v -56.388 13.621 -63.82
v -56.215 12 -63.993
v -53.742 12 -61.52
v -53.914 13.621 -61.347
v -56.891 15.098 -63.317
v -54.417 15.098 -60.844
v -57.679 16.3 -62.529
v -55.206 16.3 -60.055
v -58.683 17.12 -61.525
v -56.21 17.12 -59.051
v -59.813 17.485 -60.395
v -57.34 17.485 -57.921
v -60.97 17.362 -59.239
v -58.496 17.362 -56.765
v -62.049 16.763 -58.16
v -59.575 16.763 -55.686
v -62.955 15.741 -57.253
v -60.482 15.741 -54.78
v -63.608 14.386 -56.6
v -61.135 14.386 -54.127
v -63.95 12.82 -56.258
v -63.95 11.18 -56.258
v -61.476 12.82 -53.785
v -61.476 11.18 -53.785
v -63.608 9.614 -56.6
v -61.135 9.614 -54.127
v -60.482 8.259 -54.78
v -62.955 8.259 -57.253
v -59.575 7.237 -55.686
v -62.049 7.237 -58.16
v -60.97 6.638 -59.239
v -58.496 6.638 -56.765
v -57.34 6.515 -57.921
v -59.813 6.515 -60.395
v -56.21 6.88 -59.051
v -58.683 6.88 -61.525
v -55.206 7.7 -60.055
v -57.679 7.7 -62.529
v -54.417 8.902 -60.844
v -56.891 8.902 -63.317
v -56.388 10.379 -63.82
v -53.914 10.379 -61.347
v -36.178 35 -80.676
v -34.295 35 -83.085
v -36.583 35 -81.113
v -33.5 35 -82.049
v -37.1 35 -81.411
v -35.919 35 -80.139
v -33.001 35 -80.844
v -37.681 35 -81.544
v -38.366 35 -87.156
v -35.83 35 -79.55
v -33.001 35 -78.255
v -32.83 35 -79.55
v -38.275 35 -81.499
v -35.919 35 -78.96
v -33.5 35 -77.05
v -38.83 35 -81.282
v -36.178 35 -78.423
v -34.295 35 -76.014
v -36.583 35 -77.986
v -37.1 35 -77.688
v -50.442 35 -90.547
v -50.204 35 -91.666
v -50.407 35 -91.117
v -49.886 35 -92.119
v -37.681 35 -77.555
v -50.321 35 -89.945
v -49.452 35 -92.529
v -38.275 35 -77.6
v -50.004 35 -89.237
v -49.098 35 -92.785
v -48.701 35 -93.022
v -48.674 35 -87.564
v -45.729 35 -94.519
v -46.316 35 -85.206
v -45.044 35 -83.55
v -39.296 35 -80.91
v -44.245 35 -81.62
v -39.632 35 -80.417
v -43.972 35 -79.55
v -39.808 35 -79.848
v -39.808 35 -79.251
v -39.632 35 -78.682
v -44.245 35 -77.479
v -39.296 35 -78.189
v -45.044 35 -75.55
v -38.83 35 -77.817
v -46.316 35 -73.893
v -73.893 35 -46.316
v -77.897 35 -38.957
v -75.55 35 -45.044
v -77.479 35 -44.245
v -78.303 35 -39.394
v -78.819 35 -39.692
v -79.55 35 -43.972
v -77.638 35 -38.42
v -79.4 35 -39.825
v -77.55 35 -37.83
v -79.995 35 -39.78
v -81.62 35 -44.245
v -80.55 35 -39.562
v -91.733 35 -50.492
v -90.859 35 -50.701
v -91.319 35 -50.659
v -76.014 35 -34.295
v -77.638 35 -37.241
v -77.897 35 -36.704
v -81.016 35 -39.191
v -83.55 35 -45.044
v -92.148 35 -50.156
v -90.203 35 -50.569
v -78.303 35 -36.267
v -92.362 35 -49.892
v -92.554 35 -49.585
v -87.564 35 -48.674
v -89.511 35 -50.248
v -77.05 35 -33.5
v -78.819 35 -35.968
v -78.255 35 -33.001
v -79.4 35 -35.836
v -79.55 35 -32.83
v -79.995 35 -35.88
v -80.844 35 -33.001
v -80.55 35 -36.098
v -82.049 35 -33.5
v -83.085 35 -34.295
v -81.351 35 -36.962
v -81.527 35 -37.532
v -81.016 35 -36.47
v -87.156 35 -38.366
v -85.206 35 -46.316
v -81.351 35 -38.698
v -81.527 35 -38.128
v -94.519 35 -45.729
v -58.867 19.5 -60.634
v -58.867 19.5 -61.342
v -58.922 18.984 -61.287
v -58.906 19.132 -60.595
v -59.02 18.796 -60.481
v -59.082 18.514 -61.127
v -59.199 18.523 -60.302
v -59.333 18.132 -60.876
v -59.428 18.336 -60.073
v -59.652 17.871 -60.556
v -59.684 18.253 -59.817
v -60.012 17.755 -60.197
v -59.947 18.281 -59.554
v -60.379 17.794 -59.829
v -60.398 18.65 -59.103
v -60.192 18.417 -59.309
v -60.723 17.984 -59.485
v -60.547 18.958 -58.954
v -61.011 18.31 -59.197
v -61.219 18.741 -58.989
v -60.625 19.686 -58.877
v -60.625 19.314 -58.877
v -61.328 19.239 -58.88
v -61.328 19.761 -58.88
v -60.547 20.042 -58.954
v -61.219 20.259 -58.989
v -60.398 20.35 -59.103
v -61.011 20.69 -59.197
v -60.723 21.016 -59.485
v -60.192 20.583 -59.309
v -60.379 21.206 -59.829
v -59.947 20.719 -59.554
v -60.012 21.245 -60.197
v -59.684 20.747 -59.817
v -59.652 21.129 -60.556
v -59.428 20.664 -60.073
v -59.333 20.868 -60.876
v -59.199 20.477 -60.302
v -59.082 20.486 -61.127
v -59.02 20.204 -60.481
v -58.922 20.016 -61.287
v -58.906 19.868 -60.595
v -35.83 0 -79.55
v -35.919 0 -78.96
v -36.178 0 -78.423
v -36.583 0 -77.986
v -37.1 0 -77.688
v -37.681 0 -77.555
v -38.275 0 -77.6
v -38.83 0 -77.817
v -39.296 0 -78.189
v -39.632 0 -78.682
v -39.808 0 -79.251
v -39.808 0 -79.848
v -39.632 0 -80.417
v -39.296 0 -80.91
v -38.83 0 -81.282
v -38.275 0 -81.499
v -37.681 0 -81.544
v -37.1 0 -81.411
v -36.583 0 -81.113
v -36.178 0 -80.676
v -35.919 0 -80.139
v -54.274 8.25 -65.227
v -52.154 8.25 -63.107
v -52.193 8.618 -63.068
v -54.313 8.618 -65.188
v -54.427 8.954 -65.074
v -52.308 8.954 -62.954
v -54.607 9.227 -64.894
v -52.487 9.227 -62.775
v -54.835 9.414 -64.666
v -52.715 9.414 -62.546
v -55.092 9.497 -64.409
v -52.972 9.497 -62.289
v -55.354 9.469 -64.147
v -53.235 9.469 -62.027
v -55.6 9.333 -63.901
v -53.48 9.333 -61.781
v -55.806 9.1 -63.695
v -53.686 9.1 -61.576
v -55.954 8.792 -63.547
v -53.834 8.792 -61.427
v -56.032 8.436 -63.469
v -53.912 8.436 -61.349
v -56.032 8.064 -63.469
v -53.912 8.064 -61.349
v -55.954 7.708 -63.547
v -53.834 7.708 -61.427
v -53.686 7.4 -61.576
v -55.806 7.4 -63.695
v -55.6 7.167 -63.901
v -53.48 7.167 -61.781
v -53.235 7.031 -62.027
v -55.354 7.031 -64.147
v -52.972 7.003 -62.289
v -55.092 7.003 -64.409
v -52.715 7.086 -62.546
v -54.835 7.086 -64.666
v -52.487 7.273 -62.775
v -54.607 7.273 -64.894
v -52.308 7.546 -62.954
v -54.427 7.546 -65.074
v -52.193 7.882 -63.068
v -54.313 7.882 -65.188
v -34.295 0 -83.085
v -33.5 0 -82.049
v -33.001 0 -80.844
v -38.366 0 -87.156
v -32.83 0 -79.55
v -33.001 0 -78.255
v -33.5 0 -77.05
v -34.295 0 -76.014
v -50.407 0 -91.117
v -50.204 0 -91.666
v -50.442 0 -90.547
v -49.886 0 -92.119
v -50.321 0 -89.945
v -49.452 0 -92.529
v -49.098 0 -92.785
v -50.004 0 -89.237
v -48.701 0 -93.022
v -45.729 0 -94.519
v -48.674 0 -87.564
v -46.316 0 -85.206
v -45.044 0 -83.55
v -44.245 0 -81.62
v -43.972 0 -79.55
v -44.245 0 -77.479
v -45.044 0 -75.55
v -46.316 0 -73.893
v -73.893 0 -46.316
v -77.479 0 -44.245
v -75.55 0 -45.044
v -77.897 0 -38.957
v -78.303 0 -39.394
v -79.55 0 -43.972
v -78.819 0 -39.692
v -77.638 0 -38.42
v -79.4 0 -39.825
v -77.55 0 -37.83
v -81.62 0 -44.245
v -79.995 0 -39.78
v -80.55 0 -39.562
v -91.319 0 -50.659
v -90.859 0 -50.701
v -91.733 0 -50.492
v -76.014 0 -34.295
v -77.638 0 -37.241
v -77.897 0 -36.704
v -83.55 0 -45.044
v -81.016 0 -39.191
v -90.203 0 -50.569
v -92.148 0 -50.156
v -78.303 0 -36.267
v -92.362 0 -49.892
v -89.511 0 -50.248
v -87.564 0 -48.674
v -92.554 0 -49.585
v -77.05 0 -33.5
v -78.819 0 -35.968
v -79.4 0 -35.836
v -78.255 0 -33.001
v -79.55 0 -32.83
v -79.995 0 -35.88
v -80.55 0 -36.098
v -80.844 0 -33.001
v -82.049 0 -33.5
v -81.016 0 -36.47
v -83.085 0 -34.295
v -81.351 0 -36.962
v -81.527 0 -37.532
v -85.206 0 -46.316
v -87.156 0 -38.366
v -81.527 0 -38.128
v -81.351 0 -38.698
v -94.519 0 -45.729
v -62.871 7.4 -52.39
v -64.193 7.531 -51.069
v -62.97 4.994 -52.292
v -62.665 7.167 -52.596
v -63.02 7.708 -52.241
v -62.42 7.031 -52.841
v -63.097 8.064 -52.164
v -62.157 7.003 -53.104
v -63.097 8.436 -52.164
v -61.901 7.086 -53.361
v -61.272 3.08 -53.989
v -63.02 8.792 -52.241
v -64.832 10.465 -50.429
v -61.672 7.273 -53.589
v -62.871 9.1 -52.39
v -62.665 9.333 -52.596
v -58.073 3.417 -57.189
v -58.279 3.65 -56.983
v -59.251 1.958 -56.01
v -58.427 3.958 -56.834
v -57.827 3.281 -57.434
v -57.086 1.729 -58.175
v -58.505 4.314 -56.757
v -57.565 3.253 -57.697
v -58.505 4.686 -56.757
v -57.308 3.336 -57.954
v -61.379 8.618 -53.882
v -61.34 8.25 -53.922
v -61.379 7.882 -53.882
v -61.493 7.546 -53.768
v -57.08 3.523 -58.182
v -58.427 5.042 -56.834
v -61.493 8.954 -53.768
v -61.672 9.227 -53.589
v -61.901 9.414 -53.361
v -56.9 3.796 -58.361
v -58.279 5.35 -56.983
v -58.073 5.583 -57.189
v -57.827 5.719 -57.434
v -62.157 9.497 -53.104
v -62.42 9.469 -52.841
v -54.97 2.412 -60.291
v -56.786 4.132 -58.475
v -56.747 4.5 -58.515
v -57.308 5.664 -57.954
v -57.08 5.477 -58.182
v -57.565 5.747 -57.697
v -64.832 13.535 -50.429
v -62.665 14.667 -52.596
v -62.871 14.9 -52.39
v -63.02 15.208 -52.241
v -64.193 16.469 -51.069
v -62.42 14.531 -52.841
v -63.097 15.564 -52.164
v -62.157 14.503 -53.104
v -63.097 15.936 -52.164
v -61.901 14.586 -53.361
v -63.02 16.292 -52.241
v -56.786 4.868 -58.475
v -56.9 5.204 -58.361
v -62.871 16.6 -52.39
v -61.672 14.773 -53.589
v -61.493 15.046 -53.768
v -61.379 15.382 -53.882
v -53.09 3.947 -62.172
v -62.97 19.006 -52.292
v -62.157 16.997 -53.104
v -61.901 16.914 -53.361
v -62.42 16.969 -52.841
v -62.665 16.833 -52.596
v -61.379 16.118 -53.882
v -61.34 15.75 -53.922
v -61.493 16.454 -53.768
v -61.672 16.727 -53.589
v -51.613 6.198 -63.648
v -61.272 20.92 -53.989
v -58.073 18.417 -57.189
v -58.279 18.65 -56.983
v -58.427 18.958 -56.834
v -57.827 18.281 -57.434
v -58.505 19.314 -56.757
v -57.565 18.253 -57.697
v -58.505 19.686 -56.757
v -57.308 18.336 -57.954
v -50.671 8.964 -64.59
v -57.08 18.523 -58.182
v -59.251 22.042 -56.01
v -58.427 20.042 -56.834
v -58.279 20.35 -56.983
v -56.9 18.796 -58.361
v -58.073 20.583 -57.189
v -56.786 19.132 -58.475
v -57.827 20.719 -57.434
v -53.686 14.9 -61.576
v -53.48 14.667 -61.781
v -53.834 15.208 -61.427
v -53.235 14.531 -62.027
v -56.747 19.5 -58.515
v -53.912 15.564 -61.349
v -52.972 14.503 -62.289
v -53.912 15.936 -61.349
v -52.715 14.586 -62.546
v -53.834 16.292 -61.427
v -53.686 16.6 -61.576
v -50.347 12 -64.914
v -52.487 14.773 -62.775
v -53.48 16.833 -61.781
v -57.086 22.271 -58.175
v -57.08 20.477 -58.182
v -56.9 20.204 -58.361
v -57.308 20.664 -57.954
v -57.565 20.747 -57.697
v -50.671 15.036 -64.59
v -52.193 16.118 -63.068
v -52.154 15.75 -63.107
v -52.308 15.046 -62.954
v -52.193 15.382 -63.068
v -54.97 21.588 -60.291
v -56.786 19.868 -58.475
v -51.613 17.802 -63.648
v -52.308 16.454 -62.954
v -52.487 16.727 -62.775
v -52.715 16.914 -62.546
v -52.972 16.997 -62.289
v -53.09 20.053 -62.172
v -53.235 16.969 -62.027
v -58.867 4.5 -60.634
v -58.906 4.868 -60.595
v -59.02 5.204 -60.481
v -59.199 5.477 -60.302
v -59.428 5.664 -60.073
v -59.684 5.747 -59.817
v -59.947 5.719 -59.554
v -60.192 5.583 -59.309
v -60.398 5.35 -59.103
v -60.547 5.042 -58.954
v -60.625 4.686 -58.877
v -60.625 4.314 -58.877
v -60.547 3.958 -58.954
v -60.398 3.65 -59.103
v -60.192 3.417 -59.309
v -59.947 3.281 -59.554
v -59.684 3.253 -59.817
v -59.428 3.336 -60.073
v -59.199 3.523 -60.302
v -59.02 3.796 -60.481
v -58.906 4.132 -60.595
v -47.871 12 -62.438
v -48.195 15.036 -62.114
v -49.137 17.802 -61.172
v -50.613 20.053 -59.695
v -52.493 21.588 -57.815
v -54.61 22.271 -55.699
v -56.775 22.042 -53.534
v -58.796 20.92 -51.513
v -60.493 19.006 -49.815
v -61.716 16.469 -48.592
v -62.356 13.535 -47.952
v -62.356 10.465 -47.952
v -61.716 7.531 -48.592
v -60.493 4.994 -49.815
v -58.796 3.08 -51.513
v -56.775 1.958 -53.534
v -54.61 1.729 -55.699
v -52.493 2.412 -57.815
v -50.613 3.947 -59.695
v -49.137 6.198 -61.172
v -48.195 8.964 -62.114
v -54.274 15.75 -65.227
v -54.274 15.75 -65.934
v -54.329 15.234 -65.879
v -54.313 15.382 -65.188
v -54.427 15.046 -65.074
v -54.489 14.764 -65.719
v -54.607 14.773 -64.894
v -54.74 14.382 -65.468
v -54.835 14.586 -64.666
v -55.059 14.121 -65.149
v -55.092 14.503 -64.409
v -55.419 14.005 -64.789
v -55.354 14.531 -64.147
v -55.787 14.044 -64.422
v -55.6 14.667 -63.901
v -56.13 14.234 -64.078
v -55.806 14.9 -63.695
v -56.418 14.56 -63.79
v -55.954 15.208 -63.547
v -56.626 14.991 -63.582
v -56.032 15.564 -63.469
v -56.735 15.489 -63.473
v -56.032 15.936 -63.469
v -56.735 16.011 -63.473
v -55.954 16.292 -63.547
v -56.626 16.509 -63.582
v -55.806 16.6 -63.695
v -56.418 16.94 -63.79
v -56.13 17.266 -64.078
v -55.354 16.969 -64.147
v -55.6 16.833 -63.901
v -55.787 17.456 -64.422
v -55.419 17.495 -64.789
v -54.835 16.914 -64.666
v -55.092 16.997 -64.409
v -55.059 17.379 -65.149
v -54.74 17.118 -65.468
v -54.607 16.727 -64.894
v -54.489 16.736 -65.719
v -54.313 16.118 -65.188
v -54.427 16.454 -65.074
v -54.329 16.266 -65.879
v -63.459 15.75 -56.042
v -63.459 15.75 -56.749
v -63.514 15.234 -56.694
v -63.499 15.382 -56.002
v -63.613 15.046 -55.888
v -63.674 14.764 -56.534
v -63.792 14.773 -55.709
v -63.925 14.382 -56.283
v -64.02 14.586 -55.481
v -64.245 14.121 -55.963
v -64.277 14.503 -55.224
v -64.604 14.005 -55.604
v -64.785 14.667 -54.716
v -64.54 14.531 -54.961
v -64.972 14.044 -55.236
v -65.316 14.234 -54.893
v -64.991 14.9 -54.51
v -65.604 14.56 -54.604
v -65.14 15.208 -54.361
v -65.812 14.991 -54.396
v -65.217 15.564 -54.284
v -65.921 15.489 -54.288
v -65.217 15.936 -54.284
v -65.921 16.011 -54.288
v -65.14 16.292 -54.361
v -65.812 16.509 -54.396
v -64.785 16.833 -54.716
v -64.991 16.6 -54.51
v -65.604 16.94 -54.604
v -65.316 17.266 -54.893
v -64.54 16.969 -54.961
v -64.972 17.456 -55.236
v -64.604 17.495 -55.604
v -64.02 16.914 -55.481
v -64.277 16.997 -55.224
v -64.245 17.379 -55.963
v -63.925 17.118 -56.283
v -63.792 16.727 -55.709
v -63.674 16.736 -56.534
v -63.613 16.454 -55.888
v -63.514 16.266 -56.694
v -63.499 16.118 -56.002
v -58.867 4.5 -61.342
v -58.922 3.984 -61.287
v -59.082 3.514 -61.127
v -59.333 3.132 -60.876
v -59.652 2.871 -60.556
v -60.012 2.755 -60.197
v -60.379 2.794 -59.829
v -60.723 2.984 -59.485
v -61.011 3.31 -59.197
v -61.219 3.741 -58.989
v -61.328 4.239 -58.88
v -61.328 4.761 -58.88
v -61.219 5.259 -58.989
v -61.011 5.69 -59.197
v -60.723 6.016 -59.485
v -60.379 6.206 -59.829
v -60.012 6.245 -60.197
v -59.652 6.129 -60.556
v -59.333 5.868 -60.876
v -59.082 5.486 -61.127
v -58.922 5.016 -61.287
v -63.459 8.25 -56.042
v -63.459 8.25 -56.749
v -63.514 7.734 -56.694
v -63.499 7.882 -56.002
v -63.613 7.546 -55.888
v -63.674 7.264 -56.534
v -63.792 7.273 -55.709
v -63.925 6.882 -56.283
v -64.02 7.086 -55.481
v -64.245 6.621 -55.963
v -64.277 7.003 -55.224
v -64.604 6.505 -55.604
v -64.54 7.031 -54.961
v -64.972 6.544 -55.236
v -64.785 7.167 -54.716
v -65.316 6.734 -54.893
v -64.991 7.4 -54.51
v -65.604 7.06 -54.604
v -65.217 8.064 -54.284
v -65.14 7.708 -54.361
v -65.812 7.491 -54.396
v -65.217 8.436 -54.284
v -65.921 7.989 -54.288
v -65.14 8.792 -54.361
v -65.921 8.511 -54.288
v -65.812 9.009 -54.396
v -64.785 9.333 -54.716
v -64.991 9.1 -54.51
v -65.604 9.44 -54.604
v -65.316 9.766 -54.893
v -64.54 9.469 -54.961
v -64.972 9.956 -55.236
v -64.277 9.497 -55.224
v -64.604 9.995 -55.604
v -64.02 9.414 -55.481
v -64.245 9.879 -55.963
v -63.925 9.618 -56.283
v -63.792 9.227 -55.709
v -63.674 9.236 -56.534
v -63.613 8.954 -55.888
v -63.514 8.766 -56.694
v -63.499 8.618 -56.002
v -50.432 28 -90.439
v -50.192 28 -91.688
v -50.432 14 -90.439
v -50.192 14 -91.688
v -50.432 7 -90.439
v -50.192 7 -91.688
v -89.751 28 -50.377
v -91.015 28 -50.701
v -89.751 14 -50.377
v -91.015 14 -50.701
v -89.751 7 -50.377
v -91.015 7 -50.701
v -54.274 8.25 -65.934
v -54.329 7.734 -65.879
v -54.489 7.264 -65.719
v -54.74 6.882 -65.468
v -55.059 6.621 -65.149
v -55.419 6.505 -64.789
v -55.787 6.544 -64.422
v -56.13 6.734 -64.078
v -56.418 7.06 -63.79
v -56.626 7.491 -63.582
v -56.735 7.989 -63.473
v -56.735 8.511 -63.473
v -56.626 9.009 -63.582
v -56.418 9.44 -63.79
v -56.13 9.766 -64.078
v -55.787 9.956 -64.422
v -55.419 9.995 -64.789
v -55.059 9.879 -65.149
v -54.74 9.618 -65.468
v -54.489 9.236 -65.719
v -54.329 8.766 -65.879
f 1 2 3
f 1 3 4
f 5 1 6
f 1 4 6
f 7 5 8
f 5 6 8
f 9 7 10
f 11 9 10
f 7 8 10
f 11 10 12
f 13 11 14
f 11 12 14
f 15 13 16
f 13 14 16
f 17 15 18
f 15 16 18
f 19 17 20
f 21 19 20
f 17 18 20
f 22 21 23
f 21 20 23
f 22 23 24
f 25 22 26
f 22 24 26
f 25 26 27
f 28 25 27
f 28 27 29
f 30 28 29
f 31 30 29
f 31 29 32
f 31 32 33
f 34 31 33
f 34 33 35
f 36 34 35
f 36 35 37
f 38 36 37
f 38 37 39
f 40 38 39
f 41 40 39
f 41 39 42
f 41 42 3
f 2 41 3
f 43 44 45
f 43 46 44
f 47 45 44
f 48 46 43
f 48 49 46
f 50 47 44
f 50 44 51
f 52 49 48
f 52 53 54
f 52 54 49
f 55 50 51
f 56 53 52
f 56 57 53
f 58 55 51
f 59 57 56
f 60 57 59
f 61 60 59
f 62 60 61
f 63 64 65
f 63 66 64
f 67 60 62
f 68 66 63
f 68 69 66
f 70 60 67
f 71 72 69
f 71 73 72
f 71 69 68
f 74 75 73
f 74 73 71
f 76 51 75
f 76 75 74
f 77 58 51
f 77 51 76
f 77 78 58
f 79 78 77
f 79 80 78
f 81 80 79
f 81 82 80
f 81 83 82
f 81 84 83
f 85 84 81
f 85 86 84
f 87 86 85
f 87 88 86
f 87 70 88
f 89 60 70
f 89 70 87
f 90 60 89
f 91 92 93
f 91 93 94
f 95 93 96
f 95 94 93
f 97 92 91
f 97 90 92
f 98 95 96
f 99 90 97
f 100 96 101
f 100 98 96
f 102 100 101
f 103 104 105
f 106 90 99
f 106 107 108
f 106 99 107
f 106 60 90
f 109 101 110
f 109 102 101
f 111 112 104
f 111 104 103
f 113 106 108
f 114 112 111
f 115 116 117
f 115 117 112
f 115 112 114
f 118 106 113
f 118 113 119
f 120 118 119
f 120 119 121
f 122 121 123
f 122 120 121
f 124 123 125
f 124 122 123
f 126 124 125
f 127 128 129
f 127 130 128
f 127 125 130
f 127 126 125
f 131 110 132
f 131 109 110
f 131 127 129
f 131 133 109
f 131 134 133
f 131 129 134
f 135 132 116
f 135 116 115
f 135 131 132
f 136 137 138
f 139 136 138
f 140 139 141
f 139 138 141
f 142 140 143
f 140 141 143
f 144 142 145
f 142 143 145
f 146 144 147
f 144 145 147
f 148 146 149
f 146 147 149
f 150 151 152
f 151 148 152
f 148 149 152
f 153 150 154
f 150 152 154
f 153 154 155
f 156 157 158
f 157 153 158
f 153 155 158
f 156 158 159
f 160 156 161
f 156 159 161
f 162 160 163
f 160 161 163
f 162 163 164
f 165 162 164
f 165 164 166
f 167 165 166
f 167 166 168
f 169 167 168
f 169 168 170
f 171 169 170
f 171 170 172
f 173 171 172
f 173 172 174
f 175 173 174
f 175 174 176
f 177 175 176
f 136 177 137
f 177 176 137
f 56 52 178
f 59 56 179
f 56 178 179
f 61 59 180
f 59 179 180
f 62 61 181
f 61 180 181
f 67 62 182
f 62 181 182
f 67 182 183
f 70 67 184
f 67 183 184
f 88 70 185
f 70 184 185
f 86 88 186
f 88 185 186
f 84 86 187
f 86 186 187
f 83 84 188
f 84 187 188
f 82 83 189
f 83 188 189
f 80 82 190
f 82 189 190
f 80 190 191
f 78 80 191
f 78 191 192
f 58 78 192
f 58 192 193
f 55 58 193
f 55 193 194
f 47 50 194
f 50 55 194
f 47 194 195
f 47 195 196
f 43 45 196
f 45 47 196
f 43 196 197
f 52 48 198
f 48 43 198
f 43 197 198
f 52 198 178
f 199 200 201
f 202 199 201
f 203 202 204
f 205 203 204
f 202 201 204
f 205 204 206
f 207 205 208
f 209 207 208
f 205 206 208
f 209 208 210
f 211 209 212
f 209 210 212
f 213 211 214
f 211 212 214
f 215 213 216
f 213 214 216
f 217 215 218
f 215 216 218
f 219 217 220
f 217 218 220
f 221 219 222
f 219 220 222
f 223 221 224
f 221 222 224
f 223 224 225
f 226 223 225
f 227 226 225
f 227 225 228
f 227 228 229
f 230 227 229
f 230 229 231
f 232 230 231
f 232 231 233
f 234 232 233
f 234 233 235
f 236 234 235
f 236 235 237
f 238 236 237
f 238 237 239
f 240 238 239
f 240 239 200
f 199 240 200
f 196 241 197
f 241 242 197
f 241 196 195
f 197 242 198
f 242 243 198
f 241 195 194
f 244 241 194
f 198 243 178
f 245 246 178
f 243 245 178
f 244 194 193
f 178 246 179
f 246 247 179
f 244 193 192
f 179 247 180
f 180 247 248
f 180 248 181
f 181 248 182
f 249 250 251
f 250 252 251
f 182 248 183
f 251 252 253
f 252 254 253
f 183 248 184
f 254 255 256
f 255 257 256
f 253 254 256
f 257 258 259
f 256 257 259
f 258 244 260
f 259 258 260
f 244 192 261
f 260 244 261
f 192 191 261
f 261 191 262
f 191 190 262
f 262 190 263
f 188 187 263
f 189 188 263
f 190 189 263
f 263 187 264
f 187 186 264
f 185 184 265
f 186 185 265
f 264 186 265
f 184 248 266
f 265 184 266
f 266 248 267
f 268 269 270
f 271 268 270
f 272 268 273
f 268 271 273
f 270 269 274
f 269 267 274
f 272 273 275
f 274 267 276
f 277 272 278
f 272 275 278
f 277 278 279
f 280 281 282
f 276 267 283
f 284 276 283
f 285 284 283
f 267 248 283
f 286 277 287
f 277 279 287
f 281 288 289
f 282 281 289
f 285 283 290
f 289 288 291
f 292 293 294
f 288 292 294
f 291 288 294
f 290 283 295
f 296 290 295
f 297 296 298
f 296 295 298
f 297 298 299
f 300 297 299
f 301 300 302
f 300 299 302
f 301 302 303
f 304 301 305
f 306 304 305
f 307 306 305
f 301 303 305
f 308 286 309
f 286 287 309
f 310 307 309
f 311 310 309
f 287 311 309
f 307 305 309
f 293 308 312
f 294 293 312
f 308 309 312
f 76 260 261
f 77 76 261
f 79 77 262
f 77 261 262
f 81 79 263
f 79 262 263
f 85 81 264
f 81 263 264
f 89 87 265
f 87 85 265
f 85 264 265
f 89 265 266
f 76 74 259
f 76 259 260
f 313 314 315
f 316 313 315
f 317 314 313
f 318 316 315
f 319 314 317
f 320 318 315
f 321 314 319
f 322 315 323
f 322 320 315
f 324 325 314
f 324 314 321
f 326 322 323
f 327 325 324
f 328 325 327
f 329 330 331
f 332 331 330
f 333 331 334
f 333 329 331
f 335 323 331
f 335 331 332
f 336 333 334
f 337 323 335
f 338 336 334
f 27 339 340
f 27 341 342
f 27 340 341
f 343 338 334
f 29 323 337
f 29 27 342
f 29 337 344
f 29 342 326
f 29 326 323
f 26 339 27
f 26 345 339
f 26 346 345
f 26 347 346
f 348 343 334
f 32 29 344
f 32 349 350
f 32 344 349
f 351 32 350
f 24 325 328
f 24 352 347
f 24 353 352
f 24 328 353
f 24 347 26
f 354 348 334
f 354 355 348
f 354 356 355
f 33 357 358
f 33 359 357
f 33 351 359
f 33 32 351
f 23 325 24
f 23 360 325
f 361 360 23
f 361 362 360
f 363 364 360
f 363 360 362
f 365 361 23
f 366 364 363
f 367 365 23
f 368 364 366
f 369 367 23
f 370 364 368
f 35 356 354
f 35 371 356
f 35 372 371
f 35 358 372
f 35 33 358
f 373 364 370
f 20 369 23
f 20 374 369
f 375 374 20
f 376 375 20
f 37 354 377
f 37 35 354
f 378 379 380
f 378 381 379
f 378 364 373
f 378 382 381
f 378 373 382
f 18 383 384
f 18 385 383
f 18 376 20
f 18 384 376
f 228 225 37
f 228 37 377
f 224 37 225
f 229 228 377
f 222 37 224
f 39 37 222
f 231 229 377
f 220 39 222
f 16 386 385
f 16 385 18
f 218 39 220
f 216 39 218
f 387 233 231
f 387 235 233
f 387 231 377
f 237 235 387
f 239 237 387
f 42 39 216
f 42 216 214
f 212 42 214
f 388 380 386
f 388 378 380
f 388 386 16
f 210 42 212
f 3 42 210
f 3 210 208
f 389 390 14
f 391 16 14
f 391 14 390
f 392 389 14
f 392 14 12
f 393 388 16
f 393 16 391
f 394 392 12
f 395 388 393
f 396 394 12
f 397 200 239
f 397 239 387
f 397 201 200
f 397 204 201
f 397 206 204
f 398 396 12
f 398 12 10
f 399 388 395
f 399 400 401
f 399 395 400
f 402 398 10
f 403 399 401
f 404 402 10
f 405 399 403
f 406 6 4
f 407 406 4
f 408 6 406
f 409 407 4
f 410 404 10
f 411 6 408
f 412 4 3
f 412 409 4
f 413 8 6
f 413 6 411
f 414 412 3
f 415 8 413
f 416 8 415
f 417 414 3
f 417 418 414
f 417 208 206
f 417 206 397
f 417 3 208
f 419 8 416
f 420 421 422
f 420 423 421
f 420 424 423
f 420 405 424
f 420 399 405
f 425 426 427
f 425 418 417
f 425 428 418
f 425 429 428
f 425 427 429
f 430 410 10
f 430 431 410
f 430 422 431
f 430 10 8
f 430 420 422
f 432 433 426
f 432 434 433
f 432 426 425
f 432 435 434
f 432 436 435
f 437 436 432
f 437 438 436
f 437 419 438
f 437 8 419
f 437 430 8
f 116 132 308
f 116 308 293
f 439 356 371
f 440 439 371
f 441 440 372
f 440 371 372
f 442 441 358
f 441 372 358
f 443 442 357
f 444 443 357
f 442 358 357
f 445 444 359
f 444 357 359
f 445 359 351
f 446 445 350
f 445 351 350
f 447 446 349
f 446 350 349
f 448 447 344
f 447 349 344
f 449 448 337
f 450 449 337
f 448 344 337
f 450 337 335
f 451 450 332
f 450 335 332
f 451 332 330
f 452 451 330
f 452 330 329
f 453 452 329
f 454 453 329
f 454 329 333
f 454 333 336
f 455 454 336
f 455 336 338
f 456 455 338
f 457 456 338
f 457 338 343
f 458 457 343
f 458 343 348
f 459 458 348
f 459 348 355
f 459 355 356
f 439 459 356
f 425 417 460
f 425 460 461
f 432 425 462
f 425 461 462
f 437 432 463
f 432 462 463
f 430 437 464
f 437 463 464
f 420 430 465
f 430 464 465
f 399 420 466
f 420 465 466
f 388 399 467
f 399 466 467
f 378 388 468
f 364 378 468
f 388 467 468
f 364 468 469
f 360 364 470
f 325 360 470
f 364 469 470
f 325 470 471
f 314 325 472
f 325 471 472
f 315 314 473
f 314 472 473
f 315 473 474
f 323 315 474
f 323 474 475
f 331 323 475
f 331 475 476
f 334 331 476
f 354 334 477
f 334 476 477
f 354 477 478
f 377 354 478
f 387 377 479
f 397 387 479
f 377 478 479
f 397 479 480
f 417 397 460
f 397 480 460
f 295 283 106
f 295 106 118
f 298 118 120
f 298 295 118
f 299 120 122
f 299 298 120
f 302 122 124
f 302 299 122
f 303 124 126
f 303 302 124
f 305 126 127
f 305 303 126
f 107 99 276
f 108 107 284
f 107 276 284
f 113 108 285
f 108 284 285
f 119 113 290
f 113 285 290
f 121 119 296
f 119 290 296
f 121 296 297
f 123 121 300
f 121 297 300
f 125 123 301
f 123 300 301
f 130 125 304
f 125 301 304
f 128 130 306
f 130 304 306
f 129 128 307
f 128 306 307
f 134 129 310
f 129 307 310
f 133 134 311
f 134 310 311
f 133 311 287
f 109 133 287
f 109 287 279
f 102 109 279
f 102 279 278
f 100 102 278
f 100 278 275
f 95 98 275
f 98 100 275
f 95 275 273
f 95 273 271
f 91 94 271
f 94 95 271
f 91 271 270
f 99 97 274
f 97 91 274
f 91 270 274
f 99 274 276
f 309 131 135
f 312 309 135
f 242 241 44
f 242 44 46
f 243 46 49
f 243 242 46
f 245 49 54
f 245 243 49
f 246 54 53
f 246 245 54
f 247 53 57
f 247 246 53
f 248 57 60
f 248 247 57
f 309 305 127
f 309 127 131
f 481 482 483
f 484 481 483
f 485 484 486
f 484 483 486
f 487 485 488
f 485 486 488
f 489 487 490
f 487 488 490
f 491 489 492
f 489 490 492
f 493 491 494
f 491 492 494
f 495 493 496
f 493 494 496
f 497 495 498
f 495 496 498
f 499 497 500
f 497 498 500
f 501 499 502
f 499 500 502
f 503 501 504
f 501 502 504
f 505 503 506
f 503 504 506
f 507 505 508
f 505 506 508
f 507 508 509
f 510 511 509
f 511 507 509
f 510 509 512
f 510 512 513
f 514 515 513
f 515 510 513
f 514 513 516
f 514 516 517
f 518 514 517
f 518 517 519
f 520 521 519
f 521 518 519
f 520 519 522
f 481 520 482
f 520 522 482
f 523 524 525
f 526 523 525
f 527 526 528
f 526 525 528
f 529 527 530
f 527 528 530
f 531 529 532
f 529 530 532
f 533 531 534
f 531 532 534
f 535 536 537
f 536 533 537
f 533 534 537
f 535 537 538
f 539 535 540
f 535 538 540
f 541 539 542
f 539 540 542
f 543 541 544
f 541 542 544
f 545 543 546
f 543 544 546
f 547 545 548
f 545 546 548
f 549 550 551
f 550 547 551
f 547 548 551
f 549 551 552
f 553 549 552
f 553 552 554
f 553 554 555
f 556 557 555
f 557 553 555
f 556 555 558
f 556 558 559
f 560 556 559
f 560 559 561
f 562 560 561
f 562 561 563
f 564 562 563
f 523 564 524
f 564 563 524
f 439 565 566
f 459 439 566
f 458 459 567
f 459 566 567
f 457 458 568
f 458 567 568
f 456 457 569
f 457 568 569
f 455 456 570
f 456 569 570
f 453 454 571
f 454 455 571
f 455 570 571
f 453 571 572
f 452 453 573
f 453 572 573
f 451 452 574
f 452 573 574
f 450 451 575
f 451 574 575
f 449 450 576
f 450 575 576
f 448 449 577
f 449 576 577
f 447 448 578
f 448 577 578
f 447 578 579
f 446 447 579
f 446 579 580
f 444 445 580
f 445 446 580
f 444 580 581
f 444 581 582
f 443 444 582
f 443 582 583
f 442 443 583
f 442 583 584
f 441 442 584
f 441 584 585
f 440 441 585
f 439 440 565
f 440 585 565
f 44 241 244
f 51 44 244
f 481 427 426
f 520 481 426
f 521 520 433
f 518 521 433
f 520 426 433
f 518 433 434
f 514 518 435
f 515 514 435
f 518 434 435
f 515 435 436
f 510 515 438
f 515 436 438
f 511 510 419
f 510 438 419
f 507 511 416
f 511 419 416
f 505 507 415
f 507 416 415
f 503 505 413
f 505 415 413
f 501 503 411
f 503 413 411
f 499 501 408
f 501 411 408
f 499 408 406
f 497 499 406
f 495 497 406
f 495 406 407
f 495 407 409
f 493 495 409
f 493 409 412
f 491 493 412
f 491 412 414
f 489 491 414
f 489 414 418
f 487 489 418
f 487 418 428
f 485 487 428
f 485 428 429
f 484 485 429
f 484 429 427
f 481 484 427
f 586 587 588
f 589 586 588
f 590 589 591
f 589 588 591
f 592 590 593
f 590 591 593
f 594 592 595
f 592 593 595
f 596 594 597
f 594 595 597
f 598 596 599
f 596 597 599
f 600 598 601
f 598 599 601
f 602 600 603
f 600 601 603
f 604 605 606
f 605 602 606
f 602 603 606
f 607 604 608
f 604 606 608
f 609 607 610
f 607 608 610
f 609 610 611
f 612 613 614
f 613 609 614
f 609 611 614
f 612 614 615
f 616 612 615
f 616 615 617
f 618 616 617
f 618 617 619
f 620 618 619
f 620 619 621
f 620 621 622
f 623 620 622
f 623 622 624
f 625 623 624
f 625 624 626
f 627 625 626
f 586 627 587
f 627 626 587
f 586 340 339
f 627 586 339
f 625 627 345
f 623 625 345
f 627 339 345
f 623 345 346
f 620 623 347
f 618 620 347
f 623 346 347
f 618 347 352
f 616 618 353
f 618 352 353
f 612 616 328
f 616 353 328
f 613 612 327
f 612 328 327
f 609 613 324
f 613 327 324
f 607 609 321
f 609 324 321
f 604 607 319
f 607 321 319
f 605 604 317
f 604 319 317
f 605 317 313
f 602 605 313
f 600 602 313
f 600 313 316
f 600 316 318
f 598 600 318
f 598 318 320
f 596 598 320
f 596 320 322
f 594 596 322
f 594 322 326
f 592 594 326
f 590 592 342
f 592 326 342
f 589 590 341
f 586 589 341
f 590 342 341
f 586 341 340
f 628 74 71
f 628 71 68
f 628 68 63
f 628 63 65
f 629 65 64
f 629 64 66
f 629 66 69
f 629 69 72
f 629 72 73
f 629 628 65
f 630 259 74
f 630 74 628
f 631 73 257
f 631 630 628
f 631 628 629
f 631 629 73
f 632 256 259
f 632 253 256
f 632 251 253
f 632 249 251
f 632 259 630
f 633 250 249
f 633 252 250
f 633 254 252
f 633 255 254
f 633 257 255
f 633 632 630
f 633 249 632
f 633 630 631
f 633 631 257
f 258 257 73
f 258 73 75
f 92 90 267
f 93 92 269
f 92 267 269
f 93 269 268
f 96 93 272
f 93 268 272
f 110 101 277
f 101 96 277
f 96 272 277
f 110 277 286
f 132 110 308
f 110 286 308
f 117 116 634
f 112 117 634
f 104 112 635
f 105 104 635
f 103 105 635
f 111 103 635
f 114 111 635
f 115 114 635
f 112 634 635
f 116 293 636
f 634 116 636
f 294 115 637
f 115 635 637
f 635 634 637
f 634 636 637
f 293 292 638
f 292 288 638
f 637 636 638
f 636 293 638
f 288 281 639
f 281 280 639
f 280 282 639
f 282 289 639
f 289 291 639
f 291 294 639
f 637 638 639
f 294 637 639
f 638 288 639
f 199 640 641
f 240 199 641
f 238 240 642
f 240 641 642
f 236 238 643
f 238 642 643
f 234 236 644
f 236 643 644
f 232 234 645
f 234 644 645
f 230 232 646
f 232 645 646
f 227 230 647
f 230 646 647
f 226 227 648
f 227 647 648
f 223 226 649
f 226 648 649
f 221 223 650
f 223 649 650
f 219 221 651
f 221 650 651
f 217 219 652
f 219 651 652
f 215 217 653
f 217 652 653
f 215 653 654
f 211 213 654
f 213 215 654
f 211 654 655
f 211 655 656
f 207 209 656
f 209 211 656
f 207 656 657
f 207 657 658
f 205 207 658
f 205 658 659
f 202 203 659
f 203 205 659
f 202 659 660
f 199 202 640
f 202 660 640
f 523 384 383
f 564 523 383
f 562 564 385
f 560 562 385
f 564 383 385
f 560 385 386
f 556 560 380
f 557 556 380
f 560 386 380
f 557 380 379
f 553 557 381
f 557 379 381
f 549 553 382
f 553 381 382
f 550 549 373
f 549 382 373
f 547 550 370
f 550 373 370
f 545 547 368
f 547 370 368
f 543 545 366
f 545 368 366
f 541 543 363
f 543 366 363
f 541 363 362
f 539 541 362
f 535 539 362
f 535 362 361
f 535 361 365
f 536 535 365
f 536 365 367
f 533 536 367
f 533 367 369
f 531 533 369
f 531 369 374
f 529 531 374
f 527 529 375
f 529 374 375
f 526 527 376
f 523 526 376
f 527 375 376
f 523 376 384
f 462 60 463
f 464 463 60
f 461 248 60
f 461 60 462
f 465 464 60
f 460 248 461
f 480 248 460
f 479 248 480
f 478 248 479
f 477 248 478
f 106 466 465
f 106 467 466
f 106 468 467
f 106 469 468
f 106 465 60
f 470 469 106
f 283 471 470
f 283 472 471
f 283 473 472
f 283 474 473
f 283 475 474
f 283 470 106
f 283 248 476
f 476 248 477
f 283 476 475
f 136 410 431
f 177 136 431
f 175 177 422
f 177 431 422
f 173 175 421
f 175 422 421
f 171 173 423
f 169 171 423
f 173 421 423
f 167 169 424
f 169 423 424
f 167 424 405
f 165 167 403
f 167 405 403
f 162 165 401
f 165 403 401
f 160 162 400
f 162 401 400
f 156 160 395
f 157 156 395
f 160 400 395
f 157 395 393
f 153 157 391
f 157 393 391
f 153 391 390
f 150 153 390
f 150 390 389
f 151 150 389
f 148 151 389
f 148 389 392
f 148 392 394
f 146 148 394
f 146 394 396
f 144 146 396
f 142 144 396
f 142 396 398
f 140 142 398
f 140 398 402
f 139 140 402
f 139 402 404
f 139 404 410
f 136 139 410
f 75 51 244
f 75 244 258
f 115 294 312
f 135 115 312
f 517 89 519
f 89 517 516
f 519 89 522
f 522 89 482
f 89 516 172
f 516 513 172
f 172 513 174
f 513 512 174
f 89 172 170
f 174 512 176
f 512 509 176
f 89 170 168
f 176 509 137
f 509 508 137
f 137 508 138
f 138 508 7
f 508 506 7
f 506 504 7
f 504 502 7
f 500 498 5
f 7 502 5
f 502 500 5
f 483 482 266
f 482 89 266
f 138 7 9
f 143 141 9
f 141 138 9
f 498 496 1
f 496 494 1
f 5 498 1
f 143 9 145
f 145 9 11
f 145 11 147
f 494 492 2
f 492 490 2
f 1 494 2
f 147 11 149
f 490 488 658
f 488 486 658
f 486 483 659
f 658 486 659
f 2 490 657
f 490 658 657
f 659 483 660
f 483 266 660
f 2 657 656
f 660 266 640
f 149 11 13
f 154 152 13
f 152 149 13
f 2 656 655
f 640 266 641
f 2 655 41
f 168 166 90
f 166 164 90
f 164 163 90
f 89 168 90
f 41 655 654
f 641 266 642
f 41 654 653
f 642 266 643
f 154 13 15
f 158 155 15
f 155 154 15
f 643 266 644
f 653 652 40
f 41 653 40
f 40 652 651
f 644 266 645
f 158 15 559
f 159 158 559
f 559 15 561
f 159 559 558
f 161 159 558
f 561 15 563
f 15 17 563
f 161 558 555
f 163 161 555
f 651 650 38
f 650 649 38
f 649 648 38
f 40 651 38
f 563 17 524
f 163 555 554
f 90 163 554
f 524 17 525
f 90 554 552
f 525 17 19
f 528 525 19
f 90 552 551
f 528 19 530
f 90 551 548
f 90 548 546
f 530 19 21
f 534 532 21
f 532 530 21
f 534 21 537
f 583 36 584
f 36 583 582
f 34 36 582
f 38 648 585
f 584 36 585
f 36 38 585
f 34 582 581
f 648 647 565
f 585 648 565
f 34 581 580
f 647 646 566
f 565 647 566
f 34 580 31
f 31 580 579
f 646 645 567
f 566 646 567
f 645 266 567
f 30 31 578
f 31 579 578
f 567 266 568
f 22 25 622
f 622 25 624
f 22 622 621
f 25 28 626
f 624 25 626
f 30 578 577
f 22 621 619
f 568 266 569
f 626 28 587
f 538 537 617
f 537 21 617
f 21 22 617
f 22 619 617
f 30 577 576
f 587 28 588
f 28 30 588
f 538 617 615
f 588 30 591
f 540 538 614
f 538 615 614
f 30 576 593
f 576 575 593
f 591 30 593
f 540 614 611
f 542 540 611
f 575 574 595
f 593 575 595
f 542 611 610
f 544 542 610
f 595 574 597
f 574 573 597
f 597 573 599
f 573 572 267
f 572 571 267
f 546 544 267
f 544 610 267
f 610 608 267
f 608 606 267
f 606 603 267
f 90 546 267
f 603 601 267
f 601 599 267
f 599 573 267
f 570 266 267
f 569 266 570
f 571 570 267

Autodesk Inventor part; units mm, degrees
ref_plane "YZ Plane" through (0, 0, 0) normal (1, 0, 0) x (0, 1, 0)
ref_plane "XZ Plane" through (0, 0, 0) normal (0, 1, 0) x (-1, 0, 0)
ref_plane "XY Plane" through (0, 0, 0) normal (0, 0, 1) x (1, 0, 0)
sketch "Эскиз1" plane through (0, 0, 0) normal (0, 1, 0) x (-1, 0, 0)
  line L0 (34.2947, -76.014) -> (76.014, -34.2947)
  arc A0 (83.085, -34.2947) -> (76.014, -34.2947) centre (79.5495, -37.8302) ccw
  line L1 (83.085, -34.2947) -> (87.156, -38.3657)
  line L2 (46.3155, -73.8927) -> (73.8927, -46.3155)
  arc A1 (85.2064, -46.3155) -> (73.8927, -46.3155) centre (79.5495, -51.9723) ccw
  line L3 (85.2064, -46.3155) -> (87.5645, -48.6736)
  line L4 (92.5543, -49.5852) -> (94.5192, -45.7288)
  line L5 (87.156, -38.3657) -> (94.5192, -45.7288)
  line L6 (34.2947, -83.085) -> (38.3657, -87.156)
  arc A2 (34.2947, -76.014) -> (34.2947, -83.085) centre (37.8302, -79.5495) ccw
  arc A3 (46.3155, -73.8927) -> (46.3155, -85.2064) centre (51.9723, -79.5495) ccw
  line L7 (48.6736, -87.5645) -> (46.3155, -85.2064)
  line L8 (48.7014, -93.0224) -> (45.7288, -94.5192)
  line L9 (38.3657, -87.156) -> (45.7288, -94.5192)
  spline S0 degree 4 poles (87.5645, -48.6736) (88.1327, -49.2418) (88.8708, -49.8865) (89.7495, -50.471) (90.7127, -50.7263) (91.4939, -50.6999) (92.0261, -50.3682) (92.3519, -49.9478) (92.5543, -49.5852) knots 0 0 0 0 0 0.3763 0.501335 0.614666 0.722287 1 1 1 1 1
  spline S1 degree 4 poles (48.6736, -87.5645) (49.2196, -88.1111) (49.8318, -88.8375) (50.3553, -89.7359) (50.492, -90.7638) (50.3179, -91.6771) (49.7988, -92.3195) (49.2087, -92.7429) (48.7014, -93.0224) knots 0 0 0 0 0 0.349502 0.469309 0.582088 0.694155 1 1 1 1 1
  point P0 (0, 0)
  point P1 (49.5385, -88.5397)
  point P2 (50.0866, -89.3893)
  point P3 (50.374, -90.1304)
  point P4 (50.4468, -90.7861)
  point P5 (50.3313, -91.3833)
  point P6 (50.0252, -91.9468)
  point P7 (49.4982, -92.4922)
  point P8 (88.5759, -49.5937)
  point P9 (89.4338, -50.2024)
  point P10 (90.1559, -50.5529)
  point P11 (90.7644, -50.6948)
  point P12 (91.2858, -50.6665)
  point P13 (91.7467, -50.4838)
  point P14 (92.1672, -50.1352)
extrude "Выдавливание1" add sketch "Эскиз1" along normal blind 35
sketch "Эскиз2" plane through (-73.8927, 0, -46.3155) normal (-0.7071, 0, -0.7071) x (-0.7071, 0, 0.7071)
  line L0 (-39, 0) -> (0, 0) construction
  line L1 (0, 0) -> (0, 35) construction
  line L2 (-39, 35) -> (0, 35) construction
  line L3 (-39, 0) -> (-39, 35) construction
  line L4 (-39, 35) -> (0, 0) construction
  line L5 (0, 0) -> (0, 35) construction
  line L6 (0, 35) -> (-39, 0) construction
  circle A0 centre (-19.5, 17.5) radius 10.3
  circle A1 centre (-19.5, 17.5) radius 7.5 construction
  line L7 (-19.5, 0) -> (-19.5, 35) construction
  circle A2 centre (-19.5, 25) radius 1.25
  circle A3 centre (-25.9952, 21.25) radius 1.25
  circle A4 centre (-25.9952, 13.75) radius 1.25
  circle A5 centre (-19.5, 10) radius 1.25
  circle A6 centre (-13.0048, 13.75) radius 1.25
  circle A7 centre (-13.0048, 21.25) radius 1.25
  circle A8 centre (-19.5, 17.5) radius 5.5
  dimension "d3" = 15
  dimension "d2" = 20.6
  dimension "d4" = 2.5
  dimension "d7" = 360
  dimension "d9" = 11
sketch "Эскиз3" plane through (0, 35, 0) normal (0, 1, 0) x (1, 0, 0)
  arc A0 (-83.085, 34.2947) -> (-76.014, 34.2947) centre (-79.5495, 37.8302) ccw construction
  arc A1 (-34.2947, 76.014) -> (-34.2947, 83.085) centre (-37.8302, 79.5495) ccw construction
  circle A2 centre (-79.5495, 37.8302) radius 2
  circle A3 centre (-37.8302, 79.5495) radius 2
  point P0 (0, 0)
  dimension "d17" = 4
  dimension "d18" = 4
extrude "Выдавливание4" cut sketch "Эскиз3" against normal blind 3.5
sketch "Эскиз4" plane through (0, 0, 0) normal (0, -1, 0) x (1, 0, 0)
  arc A0 (-76.014, -34.2947) -> (-83.085, -34.2947) centre (-79.5495, -37.8302) ccw construction
  arc A1 (-34.2947, -83.085) -> (-34.2947, -76.014) centre (-37.8302, -79.5495) ccw construction
  circle A2 centre (-79.5495, -37.8302) radius 2
  circle A3 centre (-37.8302, -79.5495) radius 2
  point P0 (0, 0)
  dimension "d21" = 4
  dimension "d22" = 4
extrude "Выдавливание5" cut sketch "Эскиз4" against normal blind 3.5
sketch "Эскиз5" plane through (-34.2947, 0, -76.014) normal (0.7071, 0, 0.7071) x (0.7071, 0, -0.7071)
  line L0 (-59, 0) -> (0, 0) construction
  line L1 (0, 0) -> (0, 35) construction
  line L2 (-59, 35) -> (0, 35) construction
  line L3 (-59, 0) -> (-59, 35) construction
  circle A0 centre (-29.5, 12) radius 5.5
  circle A1 centre (-29.5, 12) radius 7.5 construction
  circle A2 centre (-29.5, 12) radius 10.3
  circle A3 centre (-29.5, 19.5) radius 1.25
  line L4 (-29.5, 12) -> (-29.5, 35) construction
  circle A4 centre (-35.9952, 15.75) radius 1.25
  circle A5 centre (-35.9952, 8.25) radius 1.25
  circle A6 centre (-29.5, 4.5) radius 1.25
  circle A7 centre (-23.0048, 8.25) radius 1.25
  circle A8 centre (-23.0048, 15.75) radius 1.25
  point P0 (-29.5, 0)
  dimension "d30" = 15
  dimension "d29" = 11
  dimension "d31" = 20.6
  dimension "d32" = 2.5
  dimension "d35" = 360
  dimension "d44" = 12
extrude "Выдавливание8" cut sketch "Эскиз5" against normal blind 13.5 contours A0 | A3 | A4 | A5 | A6 | A7 | A8
extrude "Выдавливание9" cut sketch "Эскиз5" against normal blind 3.5
chamfer "Фаска2" distance 0.5 angle 45 6 edges at (-60.988, 19.5, -59.2202) (-65.5808, 15.75, -54.6274) (-65.5808, 8.25, -54.6274) (-60.988, 4.5, -59.2202) (-56.3952, 8.25, -63.813) (-56.3952, 15.75, -63.813)
sketch "Эскиз6" plane through (-34.2947, 0, -76.014) normal (0.7071, 0, 0.7071) x (0.7071, 0, -0.7071)
  circle A0 centre (-29.5, 12) radius 10.3 construction
  point P0 (-29.5, 0)
sketch "Эскиз7" plane through (0, 35, 0) normal (0, 1, 0) x (1, 0, 0)
  circle A0 centre (0, 0) radius 98
  line L0 (-94.5632, 25.7254) -> (-115.7616, 51.7347)
  line L1 (-115.7616, 51.7347) -> (-66.5865, 100.4668)
  line L2 (-66.5865, 100.4668) -> (-28.2113, 101.4476)
  line L3 (-28.2113, 101.4476) -> (-27.0576, 94.1907)
  dimension "d45" = 196
sketch "Эскиз8" plane through (-79.5495, 31.5, -37.8302) normal (0, 1, 0) x (1, 0, 0)
  circle A0 centre (0, 0) radius 2 projected
  circle A1 centre (41.7193, 41.7193) radius 2 projected
  point P0 (79.5495, -37.8302)
extrude "Выдавливание11" cut sketch "Эскиз8" against normal blind 100
properties part number "back_motor_mount" material "Пластмасса, непрозрачная, черная"
